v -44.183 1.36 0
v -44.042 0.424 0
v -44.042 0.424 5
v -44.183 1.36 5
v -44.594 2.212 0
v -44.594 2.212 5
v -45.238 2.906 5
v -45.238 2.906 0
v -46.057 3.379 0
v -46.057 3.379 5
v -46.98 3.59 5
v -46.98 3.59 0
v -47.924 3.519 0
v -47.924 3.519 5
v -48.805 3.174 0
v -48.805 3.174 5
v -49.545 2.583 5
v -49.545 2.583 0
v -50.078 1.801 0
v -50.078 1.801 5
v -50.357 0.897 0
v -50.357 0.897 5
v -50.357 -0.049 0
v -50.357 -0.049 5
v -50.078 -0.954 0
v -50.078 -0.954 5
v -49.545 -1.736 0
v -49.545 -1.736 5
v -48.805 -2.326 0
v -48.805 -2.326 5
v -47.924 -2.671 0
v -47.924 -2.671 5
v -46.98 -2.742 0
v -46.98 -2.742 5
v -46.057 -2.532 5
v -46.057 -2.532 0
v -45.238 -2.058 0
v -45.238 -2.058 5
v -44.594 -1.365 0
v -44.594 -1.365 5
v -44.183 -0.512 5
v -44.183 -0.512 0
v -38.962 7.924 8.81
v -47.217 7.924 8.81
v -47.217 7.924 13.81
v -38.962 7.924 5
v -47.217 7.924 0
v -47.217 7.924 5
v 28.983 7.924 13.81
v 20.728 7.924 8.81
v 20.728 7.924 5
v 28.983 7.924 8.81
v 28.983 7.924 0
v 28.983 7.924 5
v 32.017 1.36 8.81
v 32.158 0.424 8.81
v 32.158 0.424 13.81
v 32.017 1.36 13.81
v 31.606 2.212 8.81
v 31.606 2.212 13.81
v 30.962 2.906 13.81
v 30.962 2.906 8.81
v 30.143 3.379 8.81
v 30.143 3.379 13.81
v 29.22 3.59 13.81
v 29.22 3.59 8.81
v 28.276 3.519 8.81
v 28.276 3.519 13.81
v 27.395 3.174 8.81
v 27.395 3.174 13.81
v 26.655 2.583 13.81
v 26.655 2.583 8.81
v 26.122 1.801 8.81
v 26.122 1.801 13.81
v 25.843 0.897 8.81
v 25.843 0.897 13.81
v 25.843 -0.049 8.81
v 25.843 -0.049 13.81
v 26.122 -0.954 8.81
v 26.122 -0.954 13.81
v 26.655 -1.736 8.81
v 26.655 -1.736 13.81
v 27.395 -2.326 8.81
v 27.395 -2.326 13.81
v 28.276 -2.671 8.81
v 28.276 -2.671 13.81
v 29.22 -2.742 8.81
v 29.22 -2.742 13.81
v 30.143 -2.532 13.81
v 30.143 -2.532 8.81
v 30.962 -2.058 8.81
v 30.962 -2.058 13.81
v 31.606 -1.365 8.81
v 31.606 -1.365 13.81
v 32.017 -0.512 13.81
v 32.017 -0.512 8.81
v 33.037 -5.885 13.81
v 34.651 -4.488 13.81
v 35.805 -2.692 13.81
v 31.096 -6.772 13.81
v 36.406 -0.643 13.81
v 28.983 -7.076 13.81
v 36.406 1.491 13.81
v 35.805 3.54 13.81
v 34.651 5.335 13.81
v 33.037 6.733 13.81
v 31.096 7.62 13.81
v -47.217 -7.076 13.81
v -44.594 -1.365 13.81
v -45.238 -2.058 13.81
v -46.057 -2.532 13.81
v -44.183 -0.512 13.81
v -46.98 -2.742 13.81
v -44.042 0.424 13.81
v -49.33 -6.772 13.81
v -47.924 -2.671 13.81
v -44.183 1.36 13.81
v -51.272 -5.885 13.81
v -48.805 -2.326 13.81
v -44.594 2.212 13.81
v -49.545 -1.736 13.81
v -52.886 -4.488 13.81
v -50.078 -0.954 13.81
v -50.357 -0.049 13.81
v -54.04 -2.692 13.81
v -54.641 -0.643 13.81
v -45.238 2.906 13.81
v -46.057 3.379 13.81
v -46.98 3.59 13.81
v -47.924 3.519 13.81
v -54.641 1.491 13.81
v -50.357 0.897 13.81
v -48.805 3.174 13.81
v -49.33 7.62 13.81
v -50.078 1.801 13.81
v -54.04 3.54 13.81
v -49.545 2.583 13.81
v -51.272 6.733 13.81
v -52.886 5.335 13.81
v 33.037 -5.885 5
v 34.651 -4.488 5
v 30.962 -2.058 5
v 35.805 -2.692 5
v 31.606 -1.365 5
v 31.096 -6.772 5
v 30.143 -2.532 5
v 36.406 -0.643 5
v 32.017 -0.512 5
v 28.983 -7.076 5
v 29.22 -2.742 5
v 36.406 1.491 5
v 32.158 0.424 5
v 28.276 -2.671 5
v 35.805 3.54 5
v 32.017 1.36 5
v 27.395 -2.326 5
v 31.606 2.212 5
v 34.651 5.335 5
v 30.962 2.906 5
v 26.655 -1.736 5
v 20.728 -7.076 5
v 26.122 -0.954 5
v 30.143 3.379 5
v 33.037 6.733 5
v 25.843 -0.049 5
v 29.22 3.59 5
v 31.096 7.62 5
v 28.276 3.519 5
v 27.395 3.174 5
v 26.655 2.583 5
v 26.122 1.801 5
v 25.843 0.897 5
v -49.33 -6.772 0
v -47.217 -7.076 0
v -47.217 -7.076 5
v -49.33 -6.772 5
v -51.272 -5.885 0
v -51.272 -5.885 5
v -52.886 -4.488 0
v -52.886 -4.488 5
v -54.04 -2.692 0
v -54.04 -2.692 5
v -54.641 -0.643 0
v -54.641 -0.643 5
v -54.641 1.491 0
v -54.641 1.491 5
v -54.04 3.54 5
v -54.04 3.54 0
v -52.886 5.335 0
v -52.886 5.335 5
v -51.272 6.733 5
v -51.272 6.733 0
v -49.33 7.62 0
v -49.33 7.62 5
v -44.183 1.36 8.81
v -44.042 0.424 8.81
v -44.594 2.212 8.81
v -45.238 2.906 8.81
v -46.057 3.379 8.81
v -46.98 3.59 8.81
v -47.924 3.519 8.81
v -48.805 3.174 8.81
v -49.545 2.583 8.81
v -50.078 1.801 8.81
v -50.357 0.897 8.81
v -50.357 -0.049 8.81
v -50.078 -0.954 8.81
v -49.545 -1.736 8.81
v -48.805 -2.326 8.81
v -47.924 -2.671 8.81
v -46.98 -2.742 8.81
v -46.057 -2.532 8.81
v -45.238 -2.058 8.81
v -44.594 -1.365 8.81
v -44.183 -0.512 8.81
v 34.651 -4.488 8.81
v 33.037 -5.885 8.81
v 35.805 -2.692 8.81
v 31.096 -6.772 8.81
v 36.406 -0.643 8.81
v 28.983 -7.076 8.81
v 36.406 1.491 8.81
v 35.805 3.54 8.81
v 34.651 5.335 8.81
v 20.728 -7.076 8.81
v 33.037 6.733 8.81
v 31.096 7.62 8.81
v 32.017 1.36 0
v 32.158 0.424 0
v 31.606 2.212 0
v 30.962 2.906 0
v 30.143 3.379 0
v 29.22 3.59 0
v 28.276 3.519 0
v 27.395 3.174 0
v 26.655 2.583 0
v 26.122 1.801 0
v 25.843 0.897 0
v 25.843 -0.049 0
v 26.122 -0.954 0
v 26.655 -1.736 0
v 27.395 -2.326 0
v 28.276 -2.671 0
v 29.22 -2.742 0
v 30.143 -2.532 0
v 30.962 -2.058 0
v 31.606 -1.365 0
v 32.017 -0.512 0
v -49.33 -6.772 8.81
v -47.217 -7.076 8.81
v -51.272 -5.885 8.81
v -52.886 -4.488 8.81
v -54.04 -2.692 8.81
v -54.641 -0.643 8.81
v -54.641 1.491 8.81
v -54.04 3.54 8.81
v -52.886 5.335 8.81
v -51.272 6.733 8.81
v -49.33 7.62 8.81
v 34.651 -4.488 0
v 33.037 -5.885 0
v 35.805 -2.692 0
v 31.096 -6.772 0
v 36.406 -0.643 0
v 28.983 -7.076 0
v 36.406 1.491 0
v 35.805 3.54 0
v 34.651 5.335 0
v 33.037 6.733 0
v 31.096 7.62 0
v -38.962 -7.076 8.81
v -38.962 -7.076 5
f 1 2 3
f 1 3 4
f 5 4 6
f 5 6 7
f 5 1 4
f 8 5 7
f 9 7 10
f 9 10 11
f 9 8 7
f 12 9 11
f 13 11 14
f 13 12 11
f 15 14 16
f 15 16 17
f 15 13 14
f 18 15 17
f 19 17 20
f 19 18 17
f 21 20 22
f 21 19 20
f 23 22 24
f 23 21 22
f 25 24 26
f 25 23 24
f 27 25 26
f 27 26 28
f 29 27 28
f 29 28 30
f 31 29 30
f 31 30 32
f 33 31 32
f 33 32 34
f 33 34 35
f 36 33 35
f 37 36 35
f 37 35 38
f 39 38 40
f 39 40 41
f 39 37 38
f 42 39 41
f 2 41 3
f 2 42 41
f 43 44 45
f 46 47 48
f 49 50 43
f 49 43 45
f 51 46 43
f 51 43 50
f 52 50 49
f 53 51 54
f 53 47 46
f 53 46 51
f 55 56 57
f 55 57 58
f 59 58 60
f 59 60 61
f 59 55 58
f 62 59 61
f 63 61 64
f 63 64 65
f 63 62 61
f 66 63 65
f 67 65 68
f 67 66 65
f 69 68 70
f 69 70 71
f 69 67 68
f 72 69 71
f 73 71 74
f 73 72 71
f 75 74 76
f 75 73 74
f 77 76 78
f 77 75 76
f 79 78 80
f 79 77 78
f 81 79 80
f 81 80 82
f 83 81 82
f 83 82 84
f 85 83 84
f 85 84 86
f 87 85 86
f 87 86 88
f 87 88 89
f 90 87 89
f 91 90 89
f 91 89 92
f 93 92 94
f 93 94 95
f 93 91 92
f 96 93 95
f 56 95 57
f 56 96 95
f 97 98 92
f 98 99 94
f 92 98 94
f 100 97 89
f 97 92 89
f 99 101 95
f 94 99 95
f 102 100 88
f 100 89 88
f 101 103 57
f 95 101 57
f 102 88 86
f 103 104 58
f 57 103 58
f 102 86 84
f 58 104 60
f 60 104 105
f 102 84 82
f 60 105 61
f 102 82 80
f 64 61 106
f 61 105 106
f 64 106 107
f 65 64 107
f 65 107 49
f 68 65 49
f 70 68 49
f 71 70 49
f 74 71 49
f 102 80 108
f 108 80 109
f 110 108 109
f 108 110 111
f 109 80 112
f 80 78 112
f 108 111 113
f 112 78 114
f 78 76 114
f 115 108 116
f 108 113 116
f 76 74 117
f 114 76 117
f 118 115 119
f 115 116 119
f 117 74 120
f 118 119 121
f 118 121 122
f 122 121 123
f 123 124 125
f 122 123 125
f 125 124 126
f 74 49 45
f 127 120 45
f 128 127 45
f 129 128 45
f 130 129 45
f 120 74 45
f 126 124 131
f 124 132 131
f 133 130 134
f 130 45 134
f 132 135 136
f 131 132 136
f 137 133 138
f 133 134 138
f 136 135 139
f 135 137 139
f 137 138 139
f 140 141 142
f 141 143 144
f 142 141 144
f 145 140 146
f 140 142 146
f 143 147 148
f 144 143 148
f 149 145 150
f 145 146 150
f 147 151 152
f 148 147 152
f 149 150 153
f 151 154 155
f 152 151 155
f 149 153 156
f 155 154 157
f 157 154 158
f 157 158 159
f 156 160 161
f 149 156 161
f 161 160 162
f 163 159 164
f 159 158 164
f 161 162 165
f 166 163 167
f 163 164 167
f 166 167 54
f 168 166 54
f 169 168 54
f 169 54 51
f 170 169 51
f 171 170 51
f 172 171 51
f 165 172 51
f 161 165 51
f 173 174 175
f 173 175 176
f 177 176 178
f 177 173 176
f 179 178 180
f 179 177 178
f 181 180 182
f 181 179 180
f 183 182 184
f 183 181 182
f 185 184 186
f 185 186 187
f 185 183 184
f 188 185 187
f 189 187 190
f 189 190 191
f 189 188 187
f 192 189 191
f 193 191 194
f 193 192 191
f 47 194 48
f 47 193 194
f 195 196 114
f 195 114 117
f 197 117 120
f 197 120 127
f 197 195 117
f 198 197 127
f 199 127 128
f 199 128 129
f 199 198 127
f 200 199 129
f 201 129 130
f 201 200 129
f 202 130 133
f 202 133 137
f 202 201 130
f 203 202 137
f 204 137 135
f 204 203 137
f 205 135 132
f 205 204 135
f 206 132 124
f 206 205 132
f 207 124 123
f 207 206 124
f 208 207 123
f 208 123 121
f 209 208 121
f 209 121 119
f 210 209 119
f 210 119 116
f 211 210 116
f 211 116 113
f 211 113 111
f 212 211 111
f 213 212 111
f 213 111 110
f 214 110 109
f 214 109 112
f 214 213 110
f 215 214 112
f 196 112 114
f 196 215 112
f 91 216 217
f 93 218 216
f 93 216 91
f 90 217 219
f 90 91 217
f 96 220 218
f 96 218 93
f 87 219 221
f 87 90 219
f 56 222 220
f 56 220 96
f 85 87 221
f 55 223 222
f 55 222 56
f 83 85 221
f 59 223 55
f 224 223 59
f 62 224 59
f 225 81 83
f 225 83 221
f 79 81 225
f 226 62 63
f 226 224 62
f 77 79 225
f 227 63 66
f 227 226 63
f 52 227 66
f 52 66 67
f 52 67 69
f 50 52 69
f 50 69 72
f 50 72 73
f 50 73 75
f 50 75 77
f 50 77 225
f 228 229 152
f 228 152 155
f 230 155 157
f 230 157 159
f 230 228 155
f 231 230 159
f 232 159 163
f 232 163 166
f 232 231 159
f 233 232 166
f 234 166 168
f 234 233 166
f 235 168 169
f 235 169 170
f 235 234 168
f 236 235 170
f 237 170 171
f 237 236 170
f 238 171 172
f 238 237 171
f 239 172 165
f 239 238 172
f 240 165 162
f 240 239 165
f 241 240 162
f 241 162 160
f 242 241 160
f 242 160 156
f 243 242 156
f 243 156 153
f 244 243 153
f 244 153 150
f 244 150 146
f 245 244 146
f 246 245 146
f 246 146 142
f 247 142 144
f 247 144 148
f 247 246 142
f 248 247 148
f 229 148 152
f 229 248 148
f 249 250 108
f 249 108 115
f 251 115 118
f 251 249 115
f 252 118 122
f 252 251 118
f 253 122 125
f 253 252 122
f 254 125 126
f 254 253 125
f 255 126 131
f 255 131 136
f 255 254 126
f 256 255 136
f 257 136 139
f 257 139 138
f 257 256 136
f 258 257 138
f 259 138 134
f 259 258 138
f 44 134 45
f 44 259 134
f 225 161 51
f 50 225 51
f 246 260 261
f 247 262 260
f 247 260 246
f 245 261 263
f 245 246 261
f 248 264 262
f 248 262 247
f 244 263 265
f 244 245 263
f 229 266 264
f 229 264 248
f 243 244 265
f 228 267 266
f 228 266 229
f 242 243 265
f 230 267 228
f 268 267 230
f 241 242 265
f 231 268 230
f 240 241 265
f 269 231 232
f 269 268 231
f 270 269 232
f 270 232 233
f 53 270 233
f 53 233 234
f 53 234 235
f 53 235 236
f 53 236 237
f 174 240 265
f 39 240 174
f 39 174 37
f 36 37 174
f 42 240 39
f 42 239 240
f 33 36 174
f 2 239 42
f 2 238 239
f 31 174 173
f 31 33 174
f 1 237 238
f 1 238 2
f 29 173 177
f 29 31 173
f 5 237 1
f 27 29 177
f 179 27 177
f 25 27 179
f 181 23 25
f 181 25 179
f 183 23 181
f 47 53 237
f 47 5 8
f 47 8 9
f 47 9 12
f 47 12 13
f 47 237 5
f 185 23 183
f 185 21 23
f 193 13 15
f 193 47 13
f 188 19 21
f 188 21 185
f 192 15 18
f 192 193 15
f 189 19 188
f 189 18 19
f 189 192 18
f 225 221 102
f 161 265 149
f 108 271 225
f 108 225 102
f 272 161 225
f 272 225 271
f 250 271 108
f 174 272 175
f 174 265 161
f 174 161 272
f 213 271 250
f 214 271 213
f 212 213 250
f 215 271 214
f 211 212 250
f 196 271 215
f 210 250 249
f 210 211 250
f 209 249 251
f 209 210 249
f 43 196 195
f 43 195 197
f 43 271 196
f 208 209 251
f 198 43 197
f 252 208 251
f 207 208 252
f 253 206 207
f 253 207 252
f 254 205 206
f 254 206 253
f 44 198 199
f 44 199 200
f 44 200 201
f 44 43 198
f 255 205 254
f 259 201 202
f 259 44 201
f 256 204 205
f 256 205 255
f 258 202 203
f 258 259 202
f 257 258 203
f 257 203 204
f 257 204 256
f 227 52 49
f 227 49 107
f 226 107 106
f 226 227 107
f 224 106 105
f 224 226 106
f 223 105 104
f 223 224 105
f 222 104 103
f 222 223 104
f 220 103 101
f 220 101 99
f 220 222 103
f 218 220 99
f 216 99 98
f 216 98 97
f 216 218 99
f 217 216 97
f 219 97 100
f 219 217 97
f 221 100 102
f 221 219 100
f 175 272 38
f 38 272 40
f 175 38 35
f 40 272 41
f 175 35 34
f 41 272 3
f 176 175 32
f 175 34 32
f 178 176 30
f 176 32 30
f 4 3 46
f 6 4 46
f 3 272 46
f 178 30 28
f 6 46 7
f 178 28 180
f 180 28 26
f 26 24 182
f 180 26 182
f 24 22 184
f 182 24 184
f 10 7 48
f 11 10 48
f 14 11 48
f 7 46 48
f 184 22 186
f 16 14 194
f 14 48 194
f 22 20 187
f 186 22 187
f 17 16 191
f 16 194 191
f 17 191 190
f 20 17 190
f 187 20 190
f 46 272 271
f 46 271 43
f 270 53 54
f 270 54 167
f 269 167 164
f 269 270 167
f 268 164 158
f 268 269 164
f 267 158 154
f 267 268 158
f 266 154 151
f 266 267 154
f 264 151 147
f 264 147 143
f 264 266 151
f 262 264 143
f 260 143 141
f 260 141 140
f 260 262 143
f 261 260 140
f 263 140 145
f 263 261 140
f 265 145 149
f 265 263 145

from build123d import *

# Parameters (mm, degrees)
SKETCH1_R           = 3.175
BOSS_EXTRUDE1_DEPTH = 5
SKETCH2_W           = 59.69
SKETCH2_H           = 15
BOSS_EXTRUDE2_DEPTH = 3.81
SKETCH5_R           = 3.175
BOSS_EXTRUDE3_DEPTH = 5


with BuildPart() as part:
    # Sketch1 → Boss-Extrude1 (new body)
    with BuildSketch(Plane.XY):
        with BuildLine():
            Line((-47.217391304, 7.923913043), (28.982608696, 7.923913043))
            ThreePointArc((28.982608696, 7.923913043), (36.482608696, 0.423913043), (28.982608696, -7.076086957))
            Line((28.982608696, -7.076086957), (-47.217391304, -7.076086957))
            ThreePointArc((-47.217391304, -7.076086957), (-54.717391304, 0.423913043), (-47.217391304, 7.923913043))
        make_face()
        with Locations((-47.217391304, 0.423913043)):
            Circle(SKETCH1_R, mode=Mode.SUBTRACT)
        with Locations((28.982608696, 0.423913043)):
            Circle(SKETCH1_R, mode=Mode.SUBTRACT)
    extrude(amount=BOSS_EXTRUDE1_DEPTH)

    # Sketch2 → Boss-Extrude2 (add)
    with BuildSketch(Plane.XY.offset(5)):
        with Locations((-9.117391304, 0.423913043)):
            Rectangle(SKETCH2_W, SKETCH2_H)
    extrude(amount=BOSS_EXTRUDE2_DEPTH)

    # Sketch5 → Boss-Extrude3 (add)
    with BuildSketch(Plane.XY.offset(8.81)):
        with BuildLine():
            Line((-47.217391304, 7.923913043), (28.982608696, 7.923913043))
            ThreePointArc((28.982608696, 7.923913043), (36.482608696, 0.423913043), (28.982608696, -7.076086957))
            Line((28.982608696, -7.076086957), (-47.217391304, -7.076086957))
            ThreePointArc((-47.217391304, -7.076086957), (-54.717391304, 0.423913043), (-47.217391304, 7.923913043))
        make_face()
        with Locations((-47.217391304, 0.423913043)):
            Circle(SKETCH5_R, mode=Mode.SUBTRACT)
        with Locations((28.982608696, 0.423913043)):
            Circle(SKETCH5_R, mode=Mode.SUBTRACT)
    extrude(amount=BOSS_EXTRUDE3_DEPTH)


solid = part.part
